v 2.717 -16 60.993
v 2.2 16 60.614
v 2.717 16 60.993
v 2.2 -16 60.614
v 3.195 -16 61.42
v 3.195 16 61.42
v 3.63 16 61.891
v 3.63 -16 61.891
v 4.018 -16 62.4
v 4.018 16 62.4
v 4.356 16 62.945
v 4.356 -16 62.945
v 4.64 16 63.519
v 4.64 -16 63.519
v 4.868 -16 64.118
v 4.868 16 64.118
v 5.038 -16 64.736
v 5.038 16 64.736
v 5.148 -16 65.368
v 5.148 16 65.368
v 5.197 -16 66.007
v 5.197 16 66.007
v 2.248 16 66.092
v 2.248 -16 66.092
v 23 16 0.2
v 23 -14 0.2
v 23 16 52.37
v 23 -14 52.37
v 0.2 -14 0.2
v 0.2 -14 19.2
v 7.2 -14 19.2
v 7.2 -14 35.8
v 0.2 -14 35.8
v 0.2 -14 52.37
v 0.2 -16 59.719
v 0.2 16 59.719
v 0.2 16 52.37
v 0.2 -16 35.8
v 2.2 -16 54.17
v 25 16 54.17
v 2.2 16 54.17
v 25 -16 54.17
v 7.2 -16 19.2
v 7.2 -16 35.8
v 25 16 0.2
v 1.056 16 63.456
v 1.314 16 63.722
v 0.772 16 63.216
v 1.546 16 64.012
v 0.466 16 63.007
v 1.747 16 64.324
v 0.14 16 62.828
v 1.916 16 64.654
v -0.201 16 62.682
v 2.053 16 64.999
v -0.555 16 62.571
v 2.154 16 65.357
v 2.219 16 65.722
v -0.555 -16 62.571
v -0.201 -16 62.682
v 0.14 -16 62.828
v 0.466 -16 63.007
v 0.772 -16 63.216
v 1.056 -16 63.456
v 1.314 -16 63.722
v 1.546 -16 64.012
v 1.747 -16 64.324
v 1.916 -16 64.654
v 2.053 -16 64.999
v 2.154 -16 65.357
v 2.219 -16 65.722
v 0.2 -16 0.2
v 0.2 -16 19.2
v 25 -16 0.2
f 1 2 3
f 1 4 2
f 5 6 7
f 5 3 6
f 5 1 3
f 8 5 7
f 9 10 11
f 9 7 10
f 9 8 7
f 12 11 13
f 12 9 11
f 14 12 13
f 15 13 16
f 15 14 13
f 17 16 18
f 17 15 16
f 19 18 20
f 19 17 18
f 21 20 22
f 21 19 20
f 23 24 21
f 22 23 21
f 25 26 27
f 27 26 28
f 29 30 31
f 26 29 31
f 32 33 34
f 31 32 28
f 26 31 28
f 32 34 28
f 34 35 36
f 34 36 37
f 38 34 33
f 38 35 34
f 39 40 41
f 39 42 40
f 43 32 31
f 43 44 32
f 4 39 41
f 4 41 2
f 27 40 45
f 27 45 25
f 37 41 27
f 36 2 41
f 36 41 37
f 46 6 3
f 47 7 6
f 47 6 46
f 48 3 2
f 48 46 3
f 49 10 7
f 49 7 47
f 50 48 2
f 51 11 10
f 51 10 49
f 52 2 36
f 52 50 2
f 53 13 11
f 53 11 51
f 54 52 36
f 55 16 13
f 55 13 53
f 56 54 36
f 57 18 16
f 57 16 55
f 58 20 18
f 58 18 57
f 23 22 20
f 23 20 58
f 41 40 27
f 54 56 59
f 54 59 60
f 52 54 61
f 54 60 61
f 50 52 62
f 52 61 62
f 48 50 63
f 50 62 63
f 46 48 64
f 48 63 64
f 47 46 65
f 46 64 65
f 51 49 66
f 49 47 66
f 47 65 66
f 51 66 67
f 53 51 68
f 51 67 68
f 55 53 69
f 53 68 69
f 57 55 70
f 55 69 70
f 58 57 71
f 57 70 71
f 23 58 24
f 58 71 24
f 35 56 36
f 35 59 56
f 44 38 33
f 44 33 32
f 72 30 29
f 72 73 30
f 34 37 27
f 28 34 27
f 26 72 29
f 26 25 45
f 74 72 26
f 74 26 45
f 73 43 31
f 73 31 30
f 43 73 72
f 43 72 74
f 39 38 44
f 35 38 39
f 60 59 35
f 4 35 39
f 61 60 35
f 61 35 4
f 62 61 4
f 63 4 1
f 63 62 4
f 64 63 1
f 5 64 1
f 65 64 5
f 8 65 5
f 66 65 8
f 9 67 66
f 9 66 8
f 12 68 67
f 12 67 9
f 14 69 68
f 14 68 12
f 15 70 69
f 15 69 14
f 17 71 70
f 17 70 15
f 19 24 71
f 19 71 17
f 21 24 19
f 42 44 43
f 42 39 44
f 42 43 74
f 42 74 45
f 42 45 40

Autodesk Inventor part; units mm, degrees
ref_plane "YZ Plane" through (0, 0, 0) normal (1, 0, 0) x (0, 1, 0)
ref_plane "XZ Plane" through (0, 0, 0) normal (0, 1, 0) x (-1, 0, 0)
ref_plane "XY Plane" through (0, 0, 0) normal (0, 0, 1) x (1, 0, 0)
sketch "Sketch1" plane through (0, 0, 0) normal (0, 1, 0) x (-1, 0, 0)
  line L0 (-0.0003, 59.6701) -> (0.6603, 62.5452) projected
  line L1 (-2.25, 66.2) -> (-5.2, 66.2) projected
  line L2 (0, 19.4) -> (-7, 19.4)
  line L3 (-7, 19.4) -> (-7, 35.6)
  line L4 (-7, 35.6) -> (0, 35.6)
  arc A0 (0.6603, 62.5452) -> (-2.25, 66.2) centre (1.5, 66.2) ccw projected
  arc A1 (3, 59.6701) -> (-5.2, 66.2) centre (1.5, 66.2) ccw projected
  arc A2 (0.6603, 62.5452) -> (-2.25, 66.2) centre (1.5, 66.2) ccw projected
  line L5 (0, 35.6) -> (0, 59.6701) projected
  line L6 (1.5, 66.2) -> (-2.25, 66.2)
  line L7 (1.5, 66.2) -> (0.6603, 62.5452)
  line L8 (1.5, 66.2) -> (-5.2118, 66.0064)
  arc A3 (-2.2484, 66.0919) -> (0.5552, 62.571) centre (1.5, 66.2) ccw
  line L9 (-0.2, 52.3701) -> (-23, 52.3701)
  line L10 (-25, 54.1701) -> (-2.2, 54.1701)
  line L11 (-23, 2.2) -> (-23, 52.3701)
  line L12 (0, 0) -> (0, 19.4) projected
  line L13 (-24.1293, 0) -> (0, 0) projected
  line L14 (-25, 0) -> (-24.1293, 0) projected
  line L15 (-25, 0.2) -> (-0.2, 0.2)
  line L16 (-0.2, 0.2) -> (-0.2, 2.2)
  line L17 (-0.2, 2.2) -> (-23, 2.2)
  line L18 (-25, 0.2) -> (-25, 54.1701)
  line L19 (-23, 2.2) -> (-23, 0.2)
  circle A4 centre (1.5, 66.2) radius 6.7
  line L20 (-0.2, 52.3701) -> (-0.2, 59.7193)
  line L21 (0.5552, 62.571) -> (-0.2, 59.7193)
  line L22 (-2.2, 54.1701) -> (-2.2, 60.6143)
  point P0 (-5.1972, 66.0068)
  dimension "d14" = 1.652
  dimension "d18" = 22.8
  dimension "d21" = 24.8
  dimension "d22" = 0.2
  dimension "d23" = 2
extrude "Extrusion1" add sketch "Sketch1" along normal mid plane 32 contours L20 L9 L11 L19 L15 L18 L10 L22 A4 | A4 L8 A3 L21
sketch "Sketch2" plane through (0, -16, 0) normal (0, -1, 0) x (1, 0, 0)
  spline S0 degree 3 poles (24.1293, 0) (23.5574, -0.0479) (22.9856, -0.0965) (22.4138, -0.1456) (19.2606, -0.4164) (16.108, -0.6985) (8.6399, -1.2015) (4.3202, -1.3606) (0, -1.3606) (-4.3202, -1.3606) (-8.6399, -1.2015) (-16.108, -0.6985) (-19.2606, -0.4164) (-22.4138, -0.1456) (-23.2758, -0.0716) (-24.1378, 0.0014) (-25, 0.0722) knots -0.172158 -0.172158 -0.172158 -0.172158 0 0 0 0.949465 0.949465 2.245518 2.245518 2.245518 3.54157 3.54157 4.491036 4.491036 4.491036 4.750564 4.750564 4.750564 4.750564 projected
  line L0 (24.1293, 0) -> (0, 0) projected
  line L1 (0, 0) -> (0, 19.4) projected
  line L2 (0, 19.4) -> (7, 19.4) projected
  line L3 (7, 35.6) -> (7, 19.4) projected
  line L4 (0, 35.6) -> (7, 35.6) projected
  line L5 (0, 35.6) -> (0, 59.6701) projected
  arc A0 (0, 59.6701) -> (0.0003, 59.6701) centre (-1.5, 66.2) ccw projected
  line L6 (0.0003, 59.6701) -> (-0.6603, 62.5452) projected
  arc A1 (2.25, 66.2) -> (-0.6603, 62.5452) centre (-1.5, 66.2) ccw projected
  line L7 (2.25, 66.2) -> (5.2, 66.2) projected
  arc A2 (5.2, 66.2) -> (-3, 59.6701) centre (-1.5, 66.2) ccw projected
  line L8 (-3, 59.6701) -> (-3, 4.75) projected
  line L9 (-25, 4.75) -> (-3, 4.75) projected
  line L10 (-25, 0.0722) -> (-25, 4.75) projected
  line L11 (0, 21.4) -> (6, 21.4) projected
  line L12 (0, 21.4) -> (0, 33.6) projected
  line L13 (0, 33.6) -> (6, 33.6) projected
  line L14 (6, 33.6) -> (6, 21.4) projected
  line L15 (0, 35.8) -> (7.2, 35.8)
  line L16 (7.2, 35.8) -> (7.2, 19.2)
  line L17 (7.2, 19.2) -> (0, 19.2)
  line L18 (0, 19.2) -> (0, 35.8)
  line L19 (0.2, 52.3701) -> (23, 52.3701) projected
  line L20 (0.2, 52.3701) -> (0.2, 35.8)
  line L21 (0.2, 19.2) -> (0.2, 0.2)
  line L22 (23, 0.2) -> (25, 0.2) projected
  line L23 (23, 52.3701) -> (23, 0.2) projected
  line L24 (0.2, 0.2) -> (23, 0.2)
  dimension "d24" = 7.2
  dimension "d25" = 16.6
  dimension "d26" = 0.2
  dimension "d27" = 0.2
extrude "Extrusion2" add sketch "Sketch2" against normal blind 2 contours L17 L16 L15 L20 L19 L23 L24 L21
equation "\"d14\" = d17"
equation "\"d17\" = 1.652443deg"
properties part number "prototype_12_cover"
